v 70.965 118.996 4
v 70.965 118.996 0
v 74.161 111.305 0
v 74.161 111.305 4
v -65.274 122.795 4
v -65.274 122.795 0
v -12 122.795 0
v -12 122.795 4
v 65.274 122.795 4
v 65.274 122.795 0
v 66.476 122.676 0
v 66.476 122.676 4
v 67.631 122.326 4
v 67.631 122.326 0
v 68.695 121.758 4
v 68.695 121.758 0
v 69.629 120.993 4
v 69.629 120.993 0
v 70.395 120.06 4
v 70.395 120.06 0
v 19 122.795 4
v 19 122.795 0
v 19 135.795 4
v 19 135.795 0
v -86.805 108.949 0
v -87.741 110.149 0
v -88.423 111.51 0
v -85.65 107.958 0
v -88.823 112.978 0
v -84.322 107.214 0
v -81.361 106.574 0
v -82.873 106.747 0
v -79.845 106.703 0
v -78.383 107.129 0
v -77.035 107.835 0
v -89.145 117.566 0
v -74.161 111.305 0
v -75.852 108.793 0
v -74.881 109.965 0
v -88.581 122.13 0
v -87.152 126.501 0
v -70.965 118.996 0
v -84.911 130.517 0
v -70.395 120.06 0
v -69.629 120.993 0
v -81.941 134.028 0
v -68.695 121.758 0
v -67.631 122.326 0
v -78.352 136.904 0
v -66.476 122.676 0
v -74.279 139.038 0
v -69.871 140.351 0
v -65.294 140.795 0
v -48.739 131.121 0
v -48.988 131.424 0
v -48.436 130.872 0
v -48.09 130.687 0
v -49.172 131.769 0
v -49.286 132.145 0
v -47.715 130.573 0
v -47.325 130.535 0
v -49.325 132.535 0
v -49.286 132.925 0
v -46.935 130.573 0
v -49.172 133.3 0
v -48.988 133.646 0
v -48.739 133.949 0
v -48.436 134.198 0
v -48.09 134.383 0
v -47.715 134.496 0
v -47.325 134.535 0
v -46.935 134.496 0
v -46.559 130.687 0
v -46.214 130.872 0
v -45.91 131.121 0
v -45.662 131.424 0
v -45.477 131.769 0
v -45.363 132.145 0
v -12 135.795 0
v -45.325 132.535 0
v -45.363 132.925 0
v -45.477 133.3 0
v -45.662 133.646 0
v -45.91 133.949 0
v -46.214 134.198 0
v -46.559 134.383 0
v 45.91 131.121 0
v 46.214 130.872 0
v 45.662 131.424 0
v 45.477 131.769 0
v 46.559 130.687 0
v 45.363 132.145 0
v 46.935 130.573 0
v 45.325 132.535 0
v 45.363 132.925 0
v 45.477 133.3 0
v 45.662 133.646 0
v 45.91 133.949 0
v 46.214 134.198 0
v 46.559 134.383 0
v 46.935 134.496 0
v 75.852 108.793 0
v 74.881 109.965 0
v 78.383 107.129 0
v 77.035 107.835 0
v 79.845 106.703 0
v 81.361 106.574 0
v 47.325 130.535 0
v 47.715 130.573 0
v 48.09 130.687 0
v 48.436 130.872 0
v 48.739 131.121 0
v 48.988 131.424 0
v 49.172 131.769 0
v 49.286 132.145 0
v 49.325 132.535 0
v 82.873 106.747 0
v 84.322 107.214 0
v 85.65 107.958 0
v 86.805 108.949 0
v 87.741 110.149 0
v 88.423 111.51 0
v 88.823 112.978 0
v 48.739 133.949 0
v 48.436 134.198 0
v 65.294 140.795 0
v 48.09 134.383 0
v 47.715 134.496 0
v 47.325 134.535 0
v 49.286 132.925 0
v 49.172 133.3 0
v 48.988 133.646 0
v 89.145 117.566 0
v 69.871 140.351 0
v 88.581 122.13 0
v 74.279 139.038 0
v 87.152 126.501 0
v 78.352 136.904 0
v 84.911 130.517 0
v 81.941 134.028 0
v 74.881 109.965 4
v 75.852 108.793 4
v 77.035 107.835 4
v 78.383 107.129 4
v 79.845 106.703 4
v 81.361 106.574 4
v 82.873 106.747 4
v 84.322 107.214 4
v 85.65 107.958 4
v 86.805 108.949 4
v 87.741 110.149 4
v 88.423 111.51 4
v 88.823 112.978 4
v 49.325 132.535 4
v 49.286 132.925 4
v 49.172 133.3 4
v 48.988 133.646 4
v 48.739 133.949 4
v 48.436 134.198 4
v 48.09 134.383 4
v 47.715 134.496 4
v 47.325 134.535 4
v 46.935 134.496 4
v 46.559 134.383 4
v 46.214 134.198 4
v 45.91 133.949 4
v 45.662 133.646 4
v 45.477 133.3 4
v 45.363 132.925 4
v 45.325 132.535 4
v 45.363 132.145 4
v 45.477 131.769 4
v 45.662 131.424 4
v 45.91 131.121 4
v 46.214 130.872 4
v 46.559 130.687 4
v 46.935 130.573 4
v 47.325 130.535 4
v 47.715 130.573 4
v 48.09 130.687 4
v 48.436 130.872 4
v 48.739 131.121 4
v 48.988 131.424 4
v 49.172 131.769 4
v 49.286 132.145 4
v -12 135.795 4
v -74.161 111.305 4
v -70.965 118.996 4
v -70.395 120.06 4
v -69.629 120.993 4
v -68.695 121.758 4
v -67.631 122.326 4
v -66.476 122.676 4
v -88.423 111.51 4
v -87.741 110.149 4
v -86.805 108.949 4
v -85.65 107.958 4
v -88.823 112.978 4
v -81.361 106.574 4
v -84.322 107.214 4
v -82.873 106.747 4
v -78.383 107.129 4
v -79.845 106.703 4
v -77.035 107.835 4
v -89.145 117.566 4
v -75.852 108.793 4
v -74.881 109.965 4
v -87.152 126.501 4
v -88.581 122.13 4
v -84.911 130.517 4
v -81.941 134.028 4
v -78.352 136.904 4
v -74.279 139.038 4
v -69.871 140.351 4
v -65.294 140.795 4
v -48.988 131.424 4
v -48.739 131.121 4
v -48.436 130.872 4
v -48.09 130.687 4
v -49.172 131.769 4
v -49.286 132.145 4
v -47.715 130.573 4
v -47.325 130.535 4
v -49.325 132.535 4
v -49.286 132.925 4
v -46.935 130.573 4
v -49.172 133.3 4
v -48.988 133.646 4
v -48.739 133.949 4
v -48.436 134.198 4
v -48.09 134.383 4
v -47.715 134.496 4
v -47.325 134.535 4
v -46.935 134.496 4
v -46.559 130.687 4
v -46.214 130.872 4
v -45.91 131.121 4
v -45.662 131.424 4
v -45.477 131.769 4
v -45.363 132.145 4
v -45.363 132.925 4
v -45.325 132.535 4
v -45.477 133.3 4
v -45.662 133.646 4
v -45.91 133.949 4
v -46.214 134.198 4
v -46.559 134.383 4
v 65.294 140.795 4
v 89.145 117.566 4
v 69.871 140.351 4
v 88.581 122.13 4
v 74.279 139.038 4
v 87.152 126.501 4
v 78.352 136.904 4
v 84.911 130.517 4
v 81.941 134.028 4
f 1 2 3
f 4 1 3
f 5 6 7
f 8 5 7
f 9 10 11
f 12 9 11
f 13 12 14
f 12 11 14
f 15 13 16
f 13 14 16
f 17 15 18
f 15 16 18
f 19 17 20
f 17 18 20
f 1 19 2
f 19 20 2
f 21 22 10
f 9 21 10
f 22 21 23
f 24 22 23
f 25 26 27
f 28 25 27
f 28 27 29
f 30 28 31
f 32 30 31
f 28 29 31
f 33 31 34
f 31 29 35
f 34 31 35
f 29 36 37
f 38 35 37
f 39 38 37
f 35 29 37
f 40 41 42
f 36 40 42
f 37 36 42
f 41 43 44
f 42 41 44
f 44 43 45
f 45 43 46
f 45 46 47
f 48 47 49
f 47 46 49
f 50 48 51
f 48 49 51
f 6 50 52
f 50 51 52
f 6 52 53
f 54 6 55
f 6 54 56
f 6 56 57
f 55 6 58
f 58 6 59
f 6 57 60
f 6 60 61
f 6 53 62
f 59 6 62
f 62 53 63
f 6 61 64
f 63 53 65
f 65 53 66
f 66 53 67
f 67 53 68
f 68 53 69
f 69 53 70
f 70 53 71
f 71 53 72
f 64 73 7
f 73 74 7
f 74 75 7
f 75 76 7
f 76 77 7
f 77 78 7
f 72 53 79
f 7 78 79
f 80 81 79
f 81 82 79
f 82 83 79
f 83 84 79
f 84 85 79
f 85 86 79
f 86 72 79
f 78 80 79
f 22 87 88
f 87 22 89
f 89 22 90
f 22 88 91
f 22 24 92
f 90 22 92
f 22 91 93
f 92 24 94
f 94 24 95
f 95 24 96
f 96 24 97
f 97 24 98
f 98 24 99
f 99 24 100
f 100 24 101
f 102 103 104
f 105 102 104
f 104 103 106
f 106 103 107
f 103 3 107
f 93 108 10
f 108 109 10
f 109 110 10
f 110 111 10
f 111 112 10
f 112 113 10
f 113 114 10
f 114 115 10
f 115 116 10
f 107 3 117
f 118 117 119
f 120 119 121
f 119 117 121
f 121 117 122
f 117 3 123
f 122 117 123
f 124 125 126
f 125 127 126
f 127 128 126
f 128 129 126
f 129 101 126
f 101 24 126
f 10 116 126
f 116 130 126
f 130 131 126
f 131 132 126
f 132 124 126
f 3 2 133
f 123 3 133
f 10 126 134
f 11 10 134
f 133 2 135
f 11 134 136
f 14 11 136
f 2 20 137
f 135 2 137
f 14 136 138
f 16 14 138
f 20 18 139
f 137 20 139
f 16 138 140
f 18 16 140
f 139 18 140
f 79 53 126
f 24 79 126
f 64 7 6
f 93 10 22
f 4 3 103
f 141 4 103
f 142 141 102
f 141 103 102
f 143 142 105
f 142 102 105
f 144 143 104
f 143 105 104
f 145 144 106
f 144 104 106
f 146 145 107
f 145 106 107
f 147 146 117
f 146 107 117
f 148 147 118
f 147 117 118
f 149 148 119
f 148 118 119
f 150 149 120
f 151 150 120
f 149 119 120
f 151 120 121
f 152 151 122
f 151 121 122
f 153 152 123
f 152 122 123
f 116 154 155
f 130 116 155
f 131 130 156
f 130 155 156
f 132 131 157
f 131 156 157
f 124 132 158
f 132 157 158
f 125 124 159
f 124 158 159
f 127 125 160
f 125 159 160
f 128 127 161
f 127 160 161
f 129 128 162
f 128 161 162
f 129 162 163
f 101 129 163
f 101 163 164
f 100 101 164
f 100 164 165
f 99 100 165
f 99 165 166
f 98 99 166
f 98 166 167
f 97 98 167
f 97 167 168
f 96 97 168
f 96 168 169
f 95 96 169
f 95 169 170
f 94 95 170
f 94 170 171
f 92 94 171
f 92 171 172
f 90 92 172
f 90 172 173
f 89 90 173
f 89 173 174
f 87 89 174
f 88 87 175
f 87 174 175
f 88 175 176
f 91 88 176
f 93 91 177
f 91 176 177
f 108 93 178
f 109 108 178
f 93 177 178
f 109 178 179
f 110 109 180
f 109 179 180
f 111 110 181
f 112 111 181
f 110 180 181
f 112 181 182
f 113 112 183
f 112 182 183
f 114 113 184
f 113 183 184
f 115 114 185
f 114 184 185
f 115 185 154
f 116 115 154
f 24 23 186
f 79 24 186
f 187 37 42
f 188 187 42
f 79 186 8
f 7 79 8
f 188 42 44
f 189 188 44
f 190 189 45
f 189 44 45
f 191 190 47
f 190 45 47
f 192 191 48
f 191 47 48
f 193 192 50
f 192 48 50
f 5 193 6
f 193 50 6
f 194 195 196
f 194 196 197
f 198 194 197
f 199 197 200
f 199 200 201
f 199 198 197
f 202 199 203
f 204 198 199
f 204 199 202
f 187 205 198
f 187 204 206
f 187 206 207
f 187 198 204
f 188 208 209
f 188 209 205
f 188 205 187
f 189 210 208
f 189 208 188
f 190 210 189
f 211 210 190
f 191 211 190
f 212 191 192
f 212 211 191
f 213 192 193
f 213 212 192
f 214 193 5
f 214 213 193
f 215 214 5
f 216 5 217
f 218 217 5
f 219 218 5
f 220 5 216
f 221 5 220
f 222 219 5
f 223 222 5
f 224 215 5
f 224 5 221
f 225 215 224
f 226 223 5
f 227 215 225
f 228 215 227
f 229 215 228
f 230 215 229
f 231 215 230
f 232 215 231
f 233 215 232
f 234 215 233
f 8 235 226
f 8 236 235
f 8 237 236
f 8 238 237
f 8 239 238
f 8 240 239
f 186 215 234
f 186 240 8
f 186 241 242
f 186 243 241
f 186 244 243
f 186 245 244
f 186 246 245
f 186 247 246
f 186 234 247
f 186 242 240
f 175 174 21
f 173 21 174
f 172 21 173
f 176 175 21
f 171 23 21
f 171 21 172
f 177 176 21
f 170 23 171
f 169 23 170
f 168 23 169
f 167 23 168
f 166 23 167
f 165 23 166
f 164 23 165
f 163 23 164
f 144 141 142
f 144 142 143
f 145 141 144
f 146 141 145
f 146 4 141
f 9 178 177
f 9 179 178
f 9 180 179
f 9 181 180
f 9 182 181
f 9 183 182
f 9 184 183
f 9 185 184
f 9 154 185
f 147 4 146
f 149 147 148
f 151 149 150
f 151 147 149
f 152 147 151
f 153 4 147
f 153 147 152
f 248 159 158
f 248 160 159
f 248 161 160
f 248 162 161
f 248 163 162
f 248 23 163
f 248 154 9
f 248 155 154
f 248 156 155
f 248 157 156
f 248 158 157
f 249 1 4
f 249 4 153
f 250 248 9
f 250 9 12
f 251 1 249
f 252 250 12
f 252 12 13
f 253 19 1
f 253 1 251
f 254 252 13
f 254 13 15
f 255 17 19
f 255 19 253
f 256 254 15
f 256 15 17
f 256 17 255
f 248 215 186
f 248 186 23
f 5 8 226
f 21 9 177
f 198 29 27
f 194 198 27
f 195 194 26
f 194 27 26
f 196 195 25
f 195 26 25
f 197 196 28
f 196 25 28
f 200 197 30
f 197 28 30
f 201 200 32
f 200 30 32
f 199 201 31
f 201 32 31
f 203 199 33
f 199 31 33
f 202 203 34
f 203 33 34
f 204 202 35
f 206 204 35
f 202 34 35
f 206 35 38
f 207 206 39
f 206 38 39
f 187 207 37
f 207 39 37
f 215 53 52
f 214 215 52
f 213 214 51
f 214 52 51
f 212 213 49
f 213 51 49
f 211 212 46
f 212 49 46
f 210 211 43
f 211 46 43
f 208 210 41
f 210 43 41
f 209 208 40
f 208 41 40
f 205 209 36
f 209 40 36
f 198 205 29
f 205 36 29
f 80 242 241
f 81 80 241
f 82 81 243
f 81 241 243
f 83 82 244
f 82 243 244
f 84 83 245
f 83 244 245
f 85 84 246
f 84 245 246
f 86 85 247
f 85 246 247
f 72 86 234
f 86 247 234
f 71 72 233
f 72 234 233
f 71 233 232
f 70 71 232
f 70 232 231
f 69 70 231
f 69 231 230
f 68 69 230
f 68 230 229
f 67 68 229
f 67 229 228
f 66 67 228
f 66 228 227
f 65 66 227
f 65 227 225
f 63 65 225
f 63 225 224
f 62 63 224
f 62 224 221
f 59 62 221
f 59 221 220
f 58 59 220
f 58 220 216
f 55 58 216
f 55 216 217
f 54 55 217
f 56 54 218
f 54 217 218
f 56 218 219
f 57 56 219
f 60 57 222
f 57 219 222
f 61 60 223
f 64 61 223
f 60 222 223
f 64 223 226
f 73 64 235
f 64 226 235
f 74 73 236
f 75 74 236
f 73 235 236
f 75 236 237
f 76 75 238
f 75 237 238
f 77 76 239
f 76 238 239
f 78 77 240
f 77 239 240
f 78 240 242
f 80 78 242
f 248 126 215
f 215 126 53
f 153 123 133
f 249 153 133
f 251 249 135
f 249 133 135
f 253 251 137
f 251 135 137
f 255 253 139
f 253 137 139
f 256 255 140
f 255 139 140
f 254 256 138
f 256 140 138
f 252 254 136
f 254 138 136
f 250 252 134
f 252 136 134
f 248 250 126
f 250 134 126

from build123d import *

# Parameters (mm, degrees)
BOSS_EXTRUDE1_DEPTH = 4
SKETCH3_R           = 2
CUT_EXTRUDE1_DEPTH  = 10
CUT_EXTRUDE2_DEPTH  = 167.695623666


with BuildPart() as part:
    # Sketch1 → Boss-Extrude1 (new body)
    with BuildSketch(Plane.XY):
        with BuildLine():
            Line((65.293896859, 140.79456376), (-65.293896859, 140.79456376))
            ThreePointArc((-65.293896859, 140.79456376), (-83.510437362, 132.343917874), (-88.822955159, 112.978151212))
            ThreePointArc((-88.822955159, 112.978151212), (-82.121571276, 106.62300147), (-74.161000128, 111.305498795))
            Line((-74.161000128, 111.305498795), (-70.965431907, 118.996456291))
            ThreePointArc((-70.965431907, 118.996456291), (-68.695430494, 121.757834263), (-65.274420897, 122.79456376))
            Line((-65.274420897, 122.79456376), (65.274420897, 122.79456376))
            ThreePointArc((65.274420897, 122.79456376), (68.695430494, 121.757834263), (70.965431907, 118.996456291))
            Line((70.965431907, 118.996456291), (74.161000128, 111.305498795))
            ThreePointArc((74.161000128, 111.305498795), (82.121571276, 106.62300147), (88.822955159, 112.978151212))
            ThreePointArc((88.822955159, 112.978151212), (83.510437362, 132.343917874), (65.293896859, 140.79456376))
        make_face()
    extrude(amount=BOSS_EXTRUDE1_DEPTH)

    # Sketch3 → Cut-Extrude1 (cut)
    with BuildSketch(Plane.XY.offset(4)):
        with Locations((-47.324700565, 132.53476761)):
            Circle(SKETCH3_R)
        with Locations((47.324700565, 132.53476761)):
            Circle(SKETCH3_R)
    extrude(amount=-CUT_EXTRUDE1_DEPTH, mode=Mode.SUBTRACT)

    # Sketch4 → Cut-Extrude2 (cut, through all)
    with BuildSketch(Plane.XY.offset(4)):
        Polygon((-11.999700565, 135.79456376), (-11.999700565, 126.79456376), (-11.999700565, 122.79456376), (19.000299435, 122.79456376), (19.000299435, 126.79456376), (19.000299435, 135.79456376), align=None)
    extrude(amount=-CUT_EXTRUDE2_DEPTH, mode=Mode.SUBTRACT)


solid = part.part
